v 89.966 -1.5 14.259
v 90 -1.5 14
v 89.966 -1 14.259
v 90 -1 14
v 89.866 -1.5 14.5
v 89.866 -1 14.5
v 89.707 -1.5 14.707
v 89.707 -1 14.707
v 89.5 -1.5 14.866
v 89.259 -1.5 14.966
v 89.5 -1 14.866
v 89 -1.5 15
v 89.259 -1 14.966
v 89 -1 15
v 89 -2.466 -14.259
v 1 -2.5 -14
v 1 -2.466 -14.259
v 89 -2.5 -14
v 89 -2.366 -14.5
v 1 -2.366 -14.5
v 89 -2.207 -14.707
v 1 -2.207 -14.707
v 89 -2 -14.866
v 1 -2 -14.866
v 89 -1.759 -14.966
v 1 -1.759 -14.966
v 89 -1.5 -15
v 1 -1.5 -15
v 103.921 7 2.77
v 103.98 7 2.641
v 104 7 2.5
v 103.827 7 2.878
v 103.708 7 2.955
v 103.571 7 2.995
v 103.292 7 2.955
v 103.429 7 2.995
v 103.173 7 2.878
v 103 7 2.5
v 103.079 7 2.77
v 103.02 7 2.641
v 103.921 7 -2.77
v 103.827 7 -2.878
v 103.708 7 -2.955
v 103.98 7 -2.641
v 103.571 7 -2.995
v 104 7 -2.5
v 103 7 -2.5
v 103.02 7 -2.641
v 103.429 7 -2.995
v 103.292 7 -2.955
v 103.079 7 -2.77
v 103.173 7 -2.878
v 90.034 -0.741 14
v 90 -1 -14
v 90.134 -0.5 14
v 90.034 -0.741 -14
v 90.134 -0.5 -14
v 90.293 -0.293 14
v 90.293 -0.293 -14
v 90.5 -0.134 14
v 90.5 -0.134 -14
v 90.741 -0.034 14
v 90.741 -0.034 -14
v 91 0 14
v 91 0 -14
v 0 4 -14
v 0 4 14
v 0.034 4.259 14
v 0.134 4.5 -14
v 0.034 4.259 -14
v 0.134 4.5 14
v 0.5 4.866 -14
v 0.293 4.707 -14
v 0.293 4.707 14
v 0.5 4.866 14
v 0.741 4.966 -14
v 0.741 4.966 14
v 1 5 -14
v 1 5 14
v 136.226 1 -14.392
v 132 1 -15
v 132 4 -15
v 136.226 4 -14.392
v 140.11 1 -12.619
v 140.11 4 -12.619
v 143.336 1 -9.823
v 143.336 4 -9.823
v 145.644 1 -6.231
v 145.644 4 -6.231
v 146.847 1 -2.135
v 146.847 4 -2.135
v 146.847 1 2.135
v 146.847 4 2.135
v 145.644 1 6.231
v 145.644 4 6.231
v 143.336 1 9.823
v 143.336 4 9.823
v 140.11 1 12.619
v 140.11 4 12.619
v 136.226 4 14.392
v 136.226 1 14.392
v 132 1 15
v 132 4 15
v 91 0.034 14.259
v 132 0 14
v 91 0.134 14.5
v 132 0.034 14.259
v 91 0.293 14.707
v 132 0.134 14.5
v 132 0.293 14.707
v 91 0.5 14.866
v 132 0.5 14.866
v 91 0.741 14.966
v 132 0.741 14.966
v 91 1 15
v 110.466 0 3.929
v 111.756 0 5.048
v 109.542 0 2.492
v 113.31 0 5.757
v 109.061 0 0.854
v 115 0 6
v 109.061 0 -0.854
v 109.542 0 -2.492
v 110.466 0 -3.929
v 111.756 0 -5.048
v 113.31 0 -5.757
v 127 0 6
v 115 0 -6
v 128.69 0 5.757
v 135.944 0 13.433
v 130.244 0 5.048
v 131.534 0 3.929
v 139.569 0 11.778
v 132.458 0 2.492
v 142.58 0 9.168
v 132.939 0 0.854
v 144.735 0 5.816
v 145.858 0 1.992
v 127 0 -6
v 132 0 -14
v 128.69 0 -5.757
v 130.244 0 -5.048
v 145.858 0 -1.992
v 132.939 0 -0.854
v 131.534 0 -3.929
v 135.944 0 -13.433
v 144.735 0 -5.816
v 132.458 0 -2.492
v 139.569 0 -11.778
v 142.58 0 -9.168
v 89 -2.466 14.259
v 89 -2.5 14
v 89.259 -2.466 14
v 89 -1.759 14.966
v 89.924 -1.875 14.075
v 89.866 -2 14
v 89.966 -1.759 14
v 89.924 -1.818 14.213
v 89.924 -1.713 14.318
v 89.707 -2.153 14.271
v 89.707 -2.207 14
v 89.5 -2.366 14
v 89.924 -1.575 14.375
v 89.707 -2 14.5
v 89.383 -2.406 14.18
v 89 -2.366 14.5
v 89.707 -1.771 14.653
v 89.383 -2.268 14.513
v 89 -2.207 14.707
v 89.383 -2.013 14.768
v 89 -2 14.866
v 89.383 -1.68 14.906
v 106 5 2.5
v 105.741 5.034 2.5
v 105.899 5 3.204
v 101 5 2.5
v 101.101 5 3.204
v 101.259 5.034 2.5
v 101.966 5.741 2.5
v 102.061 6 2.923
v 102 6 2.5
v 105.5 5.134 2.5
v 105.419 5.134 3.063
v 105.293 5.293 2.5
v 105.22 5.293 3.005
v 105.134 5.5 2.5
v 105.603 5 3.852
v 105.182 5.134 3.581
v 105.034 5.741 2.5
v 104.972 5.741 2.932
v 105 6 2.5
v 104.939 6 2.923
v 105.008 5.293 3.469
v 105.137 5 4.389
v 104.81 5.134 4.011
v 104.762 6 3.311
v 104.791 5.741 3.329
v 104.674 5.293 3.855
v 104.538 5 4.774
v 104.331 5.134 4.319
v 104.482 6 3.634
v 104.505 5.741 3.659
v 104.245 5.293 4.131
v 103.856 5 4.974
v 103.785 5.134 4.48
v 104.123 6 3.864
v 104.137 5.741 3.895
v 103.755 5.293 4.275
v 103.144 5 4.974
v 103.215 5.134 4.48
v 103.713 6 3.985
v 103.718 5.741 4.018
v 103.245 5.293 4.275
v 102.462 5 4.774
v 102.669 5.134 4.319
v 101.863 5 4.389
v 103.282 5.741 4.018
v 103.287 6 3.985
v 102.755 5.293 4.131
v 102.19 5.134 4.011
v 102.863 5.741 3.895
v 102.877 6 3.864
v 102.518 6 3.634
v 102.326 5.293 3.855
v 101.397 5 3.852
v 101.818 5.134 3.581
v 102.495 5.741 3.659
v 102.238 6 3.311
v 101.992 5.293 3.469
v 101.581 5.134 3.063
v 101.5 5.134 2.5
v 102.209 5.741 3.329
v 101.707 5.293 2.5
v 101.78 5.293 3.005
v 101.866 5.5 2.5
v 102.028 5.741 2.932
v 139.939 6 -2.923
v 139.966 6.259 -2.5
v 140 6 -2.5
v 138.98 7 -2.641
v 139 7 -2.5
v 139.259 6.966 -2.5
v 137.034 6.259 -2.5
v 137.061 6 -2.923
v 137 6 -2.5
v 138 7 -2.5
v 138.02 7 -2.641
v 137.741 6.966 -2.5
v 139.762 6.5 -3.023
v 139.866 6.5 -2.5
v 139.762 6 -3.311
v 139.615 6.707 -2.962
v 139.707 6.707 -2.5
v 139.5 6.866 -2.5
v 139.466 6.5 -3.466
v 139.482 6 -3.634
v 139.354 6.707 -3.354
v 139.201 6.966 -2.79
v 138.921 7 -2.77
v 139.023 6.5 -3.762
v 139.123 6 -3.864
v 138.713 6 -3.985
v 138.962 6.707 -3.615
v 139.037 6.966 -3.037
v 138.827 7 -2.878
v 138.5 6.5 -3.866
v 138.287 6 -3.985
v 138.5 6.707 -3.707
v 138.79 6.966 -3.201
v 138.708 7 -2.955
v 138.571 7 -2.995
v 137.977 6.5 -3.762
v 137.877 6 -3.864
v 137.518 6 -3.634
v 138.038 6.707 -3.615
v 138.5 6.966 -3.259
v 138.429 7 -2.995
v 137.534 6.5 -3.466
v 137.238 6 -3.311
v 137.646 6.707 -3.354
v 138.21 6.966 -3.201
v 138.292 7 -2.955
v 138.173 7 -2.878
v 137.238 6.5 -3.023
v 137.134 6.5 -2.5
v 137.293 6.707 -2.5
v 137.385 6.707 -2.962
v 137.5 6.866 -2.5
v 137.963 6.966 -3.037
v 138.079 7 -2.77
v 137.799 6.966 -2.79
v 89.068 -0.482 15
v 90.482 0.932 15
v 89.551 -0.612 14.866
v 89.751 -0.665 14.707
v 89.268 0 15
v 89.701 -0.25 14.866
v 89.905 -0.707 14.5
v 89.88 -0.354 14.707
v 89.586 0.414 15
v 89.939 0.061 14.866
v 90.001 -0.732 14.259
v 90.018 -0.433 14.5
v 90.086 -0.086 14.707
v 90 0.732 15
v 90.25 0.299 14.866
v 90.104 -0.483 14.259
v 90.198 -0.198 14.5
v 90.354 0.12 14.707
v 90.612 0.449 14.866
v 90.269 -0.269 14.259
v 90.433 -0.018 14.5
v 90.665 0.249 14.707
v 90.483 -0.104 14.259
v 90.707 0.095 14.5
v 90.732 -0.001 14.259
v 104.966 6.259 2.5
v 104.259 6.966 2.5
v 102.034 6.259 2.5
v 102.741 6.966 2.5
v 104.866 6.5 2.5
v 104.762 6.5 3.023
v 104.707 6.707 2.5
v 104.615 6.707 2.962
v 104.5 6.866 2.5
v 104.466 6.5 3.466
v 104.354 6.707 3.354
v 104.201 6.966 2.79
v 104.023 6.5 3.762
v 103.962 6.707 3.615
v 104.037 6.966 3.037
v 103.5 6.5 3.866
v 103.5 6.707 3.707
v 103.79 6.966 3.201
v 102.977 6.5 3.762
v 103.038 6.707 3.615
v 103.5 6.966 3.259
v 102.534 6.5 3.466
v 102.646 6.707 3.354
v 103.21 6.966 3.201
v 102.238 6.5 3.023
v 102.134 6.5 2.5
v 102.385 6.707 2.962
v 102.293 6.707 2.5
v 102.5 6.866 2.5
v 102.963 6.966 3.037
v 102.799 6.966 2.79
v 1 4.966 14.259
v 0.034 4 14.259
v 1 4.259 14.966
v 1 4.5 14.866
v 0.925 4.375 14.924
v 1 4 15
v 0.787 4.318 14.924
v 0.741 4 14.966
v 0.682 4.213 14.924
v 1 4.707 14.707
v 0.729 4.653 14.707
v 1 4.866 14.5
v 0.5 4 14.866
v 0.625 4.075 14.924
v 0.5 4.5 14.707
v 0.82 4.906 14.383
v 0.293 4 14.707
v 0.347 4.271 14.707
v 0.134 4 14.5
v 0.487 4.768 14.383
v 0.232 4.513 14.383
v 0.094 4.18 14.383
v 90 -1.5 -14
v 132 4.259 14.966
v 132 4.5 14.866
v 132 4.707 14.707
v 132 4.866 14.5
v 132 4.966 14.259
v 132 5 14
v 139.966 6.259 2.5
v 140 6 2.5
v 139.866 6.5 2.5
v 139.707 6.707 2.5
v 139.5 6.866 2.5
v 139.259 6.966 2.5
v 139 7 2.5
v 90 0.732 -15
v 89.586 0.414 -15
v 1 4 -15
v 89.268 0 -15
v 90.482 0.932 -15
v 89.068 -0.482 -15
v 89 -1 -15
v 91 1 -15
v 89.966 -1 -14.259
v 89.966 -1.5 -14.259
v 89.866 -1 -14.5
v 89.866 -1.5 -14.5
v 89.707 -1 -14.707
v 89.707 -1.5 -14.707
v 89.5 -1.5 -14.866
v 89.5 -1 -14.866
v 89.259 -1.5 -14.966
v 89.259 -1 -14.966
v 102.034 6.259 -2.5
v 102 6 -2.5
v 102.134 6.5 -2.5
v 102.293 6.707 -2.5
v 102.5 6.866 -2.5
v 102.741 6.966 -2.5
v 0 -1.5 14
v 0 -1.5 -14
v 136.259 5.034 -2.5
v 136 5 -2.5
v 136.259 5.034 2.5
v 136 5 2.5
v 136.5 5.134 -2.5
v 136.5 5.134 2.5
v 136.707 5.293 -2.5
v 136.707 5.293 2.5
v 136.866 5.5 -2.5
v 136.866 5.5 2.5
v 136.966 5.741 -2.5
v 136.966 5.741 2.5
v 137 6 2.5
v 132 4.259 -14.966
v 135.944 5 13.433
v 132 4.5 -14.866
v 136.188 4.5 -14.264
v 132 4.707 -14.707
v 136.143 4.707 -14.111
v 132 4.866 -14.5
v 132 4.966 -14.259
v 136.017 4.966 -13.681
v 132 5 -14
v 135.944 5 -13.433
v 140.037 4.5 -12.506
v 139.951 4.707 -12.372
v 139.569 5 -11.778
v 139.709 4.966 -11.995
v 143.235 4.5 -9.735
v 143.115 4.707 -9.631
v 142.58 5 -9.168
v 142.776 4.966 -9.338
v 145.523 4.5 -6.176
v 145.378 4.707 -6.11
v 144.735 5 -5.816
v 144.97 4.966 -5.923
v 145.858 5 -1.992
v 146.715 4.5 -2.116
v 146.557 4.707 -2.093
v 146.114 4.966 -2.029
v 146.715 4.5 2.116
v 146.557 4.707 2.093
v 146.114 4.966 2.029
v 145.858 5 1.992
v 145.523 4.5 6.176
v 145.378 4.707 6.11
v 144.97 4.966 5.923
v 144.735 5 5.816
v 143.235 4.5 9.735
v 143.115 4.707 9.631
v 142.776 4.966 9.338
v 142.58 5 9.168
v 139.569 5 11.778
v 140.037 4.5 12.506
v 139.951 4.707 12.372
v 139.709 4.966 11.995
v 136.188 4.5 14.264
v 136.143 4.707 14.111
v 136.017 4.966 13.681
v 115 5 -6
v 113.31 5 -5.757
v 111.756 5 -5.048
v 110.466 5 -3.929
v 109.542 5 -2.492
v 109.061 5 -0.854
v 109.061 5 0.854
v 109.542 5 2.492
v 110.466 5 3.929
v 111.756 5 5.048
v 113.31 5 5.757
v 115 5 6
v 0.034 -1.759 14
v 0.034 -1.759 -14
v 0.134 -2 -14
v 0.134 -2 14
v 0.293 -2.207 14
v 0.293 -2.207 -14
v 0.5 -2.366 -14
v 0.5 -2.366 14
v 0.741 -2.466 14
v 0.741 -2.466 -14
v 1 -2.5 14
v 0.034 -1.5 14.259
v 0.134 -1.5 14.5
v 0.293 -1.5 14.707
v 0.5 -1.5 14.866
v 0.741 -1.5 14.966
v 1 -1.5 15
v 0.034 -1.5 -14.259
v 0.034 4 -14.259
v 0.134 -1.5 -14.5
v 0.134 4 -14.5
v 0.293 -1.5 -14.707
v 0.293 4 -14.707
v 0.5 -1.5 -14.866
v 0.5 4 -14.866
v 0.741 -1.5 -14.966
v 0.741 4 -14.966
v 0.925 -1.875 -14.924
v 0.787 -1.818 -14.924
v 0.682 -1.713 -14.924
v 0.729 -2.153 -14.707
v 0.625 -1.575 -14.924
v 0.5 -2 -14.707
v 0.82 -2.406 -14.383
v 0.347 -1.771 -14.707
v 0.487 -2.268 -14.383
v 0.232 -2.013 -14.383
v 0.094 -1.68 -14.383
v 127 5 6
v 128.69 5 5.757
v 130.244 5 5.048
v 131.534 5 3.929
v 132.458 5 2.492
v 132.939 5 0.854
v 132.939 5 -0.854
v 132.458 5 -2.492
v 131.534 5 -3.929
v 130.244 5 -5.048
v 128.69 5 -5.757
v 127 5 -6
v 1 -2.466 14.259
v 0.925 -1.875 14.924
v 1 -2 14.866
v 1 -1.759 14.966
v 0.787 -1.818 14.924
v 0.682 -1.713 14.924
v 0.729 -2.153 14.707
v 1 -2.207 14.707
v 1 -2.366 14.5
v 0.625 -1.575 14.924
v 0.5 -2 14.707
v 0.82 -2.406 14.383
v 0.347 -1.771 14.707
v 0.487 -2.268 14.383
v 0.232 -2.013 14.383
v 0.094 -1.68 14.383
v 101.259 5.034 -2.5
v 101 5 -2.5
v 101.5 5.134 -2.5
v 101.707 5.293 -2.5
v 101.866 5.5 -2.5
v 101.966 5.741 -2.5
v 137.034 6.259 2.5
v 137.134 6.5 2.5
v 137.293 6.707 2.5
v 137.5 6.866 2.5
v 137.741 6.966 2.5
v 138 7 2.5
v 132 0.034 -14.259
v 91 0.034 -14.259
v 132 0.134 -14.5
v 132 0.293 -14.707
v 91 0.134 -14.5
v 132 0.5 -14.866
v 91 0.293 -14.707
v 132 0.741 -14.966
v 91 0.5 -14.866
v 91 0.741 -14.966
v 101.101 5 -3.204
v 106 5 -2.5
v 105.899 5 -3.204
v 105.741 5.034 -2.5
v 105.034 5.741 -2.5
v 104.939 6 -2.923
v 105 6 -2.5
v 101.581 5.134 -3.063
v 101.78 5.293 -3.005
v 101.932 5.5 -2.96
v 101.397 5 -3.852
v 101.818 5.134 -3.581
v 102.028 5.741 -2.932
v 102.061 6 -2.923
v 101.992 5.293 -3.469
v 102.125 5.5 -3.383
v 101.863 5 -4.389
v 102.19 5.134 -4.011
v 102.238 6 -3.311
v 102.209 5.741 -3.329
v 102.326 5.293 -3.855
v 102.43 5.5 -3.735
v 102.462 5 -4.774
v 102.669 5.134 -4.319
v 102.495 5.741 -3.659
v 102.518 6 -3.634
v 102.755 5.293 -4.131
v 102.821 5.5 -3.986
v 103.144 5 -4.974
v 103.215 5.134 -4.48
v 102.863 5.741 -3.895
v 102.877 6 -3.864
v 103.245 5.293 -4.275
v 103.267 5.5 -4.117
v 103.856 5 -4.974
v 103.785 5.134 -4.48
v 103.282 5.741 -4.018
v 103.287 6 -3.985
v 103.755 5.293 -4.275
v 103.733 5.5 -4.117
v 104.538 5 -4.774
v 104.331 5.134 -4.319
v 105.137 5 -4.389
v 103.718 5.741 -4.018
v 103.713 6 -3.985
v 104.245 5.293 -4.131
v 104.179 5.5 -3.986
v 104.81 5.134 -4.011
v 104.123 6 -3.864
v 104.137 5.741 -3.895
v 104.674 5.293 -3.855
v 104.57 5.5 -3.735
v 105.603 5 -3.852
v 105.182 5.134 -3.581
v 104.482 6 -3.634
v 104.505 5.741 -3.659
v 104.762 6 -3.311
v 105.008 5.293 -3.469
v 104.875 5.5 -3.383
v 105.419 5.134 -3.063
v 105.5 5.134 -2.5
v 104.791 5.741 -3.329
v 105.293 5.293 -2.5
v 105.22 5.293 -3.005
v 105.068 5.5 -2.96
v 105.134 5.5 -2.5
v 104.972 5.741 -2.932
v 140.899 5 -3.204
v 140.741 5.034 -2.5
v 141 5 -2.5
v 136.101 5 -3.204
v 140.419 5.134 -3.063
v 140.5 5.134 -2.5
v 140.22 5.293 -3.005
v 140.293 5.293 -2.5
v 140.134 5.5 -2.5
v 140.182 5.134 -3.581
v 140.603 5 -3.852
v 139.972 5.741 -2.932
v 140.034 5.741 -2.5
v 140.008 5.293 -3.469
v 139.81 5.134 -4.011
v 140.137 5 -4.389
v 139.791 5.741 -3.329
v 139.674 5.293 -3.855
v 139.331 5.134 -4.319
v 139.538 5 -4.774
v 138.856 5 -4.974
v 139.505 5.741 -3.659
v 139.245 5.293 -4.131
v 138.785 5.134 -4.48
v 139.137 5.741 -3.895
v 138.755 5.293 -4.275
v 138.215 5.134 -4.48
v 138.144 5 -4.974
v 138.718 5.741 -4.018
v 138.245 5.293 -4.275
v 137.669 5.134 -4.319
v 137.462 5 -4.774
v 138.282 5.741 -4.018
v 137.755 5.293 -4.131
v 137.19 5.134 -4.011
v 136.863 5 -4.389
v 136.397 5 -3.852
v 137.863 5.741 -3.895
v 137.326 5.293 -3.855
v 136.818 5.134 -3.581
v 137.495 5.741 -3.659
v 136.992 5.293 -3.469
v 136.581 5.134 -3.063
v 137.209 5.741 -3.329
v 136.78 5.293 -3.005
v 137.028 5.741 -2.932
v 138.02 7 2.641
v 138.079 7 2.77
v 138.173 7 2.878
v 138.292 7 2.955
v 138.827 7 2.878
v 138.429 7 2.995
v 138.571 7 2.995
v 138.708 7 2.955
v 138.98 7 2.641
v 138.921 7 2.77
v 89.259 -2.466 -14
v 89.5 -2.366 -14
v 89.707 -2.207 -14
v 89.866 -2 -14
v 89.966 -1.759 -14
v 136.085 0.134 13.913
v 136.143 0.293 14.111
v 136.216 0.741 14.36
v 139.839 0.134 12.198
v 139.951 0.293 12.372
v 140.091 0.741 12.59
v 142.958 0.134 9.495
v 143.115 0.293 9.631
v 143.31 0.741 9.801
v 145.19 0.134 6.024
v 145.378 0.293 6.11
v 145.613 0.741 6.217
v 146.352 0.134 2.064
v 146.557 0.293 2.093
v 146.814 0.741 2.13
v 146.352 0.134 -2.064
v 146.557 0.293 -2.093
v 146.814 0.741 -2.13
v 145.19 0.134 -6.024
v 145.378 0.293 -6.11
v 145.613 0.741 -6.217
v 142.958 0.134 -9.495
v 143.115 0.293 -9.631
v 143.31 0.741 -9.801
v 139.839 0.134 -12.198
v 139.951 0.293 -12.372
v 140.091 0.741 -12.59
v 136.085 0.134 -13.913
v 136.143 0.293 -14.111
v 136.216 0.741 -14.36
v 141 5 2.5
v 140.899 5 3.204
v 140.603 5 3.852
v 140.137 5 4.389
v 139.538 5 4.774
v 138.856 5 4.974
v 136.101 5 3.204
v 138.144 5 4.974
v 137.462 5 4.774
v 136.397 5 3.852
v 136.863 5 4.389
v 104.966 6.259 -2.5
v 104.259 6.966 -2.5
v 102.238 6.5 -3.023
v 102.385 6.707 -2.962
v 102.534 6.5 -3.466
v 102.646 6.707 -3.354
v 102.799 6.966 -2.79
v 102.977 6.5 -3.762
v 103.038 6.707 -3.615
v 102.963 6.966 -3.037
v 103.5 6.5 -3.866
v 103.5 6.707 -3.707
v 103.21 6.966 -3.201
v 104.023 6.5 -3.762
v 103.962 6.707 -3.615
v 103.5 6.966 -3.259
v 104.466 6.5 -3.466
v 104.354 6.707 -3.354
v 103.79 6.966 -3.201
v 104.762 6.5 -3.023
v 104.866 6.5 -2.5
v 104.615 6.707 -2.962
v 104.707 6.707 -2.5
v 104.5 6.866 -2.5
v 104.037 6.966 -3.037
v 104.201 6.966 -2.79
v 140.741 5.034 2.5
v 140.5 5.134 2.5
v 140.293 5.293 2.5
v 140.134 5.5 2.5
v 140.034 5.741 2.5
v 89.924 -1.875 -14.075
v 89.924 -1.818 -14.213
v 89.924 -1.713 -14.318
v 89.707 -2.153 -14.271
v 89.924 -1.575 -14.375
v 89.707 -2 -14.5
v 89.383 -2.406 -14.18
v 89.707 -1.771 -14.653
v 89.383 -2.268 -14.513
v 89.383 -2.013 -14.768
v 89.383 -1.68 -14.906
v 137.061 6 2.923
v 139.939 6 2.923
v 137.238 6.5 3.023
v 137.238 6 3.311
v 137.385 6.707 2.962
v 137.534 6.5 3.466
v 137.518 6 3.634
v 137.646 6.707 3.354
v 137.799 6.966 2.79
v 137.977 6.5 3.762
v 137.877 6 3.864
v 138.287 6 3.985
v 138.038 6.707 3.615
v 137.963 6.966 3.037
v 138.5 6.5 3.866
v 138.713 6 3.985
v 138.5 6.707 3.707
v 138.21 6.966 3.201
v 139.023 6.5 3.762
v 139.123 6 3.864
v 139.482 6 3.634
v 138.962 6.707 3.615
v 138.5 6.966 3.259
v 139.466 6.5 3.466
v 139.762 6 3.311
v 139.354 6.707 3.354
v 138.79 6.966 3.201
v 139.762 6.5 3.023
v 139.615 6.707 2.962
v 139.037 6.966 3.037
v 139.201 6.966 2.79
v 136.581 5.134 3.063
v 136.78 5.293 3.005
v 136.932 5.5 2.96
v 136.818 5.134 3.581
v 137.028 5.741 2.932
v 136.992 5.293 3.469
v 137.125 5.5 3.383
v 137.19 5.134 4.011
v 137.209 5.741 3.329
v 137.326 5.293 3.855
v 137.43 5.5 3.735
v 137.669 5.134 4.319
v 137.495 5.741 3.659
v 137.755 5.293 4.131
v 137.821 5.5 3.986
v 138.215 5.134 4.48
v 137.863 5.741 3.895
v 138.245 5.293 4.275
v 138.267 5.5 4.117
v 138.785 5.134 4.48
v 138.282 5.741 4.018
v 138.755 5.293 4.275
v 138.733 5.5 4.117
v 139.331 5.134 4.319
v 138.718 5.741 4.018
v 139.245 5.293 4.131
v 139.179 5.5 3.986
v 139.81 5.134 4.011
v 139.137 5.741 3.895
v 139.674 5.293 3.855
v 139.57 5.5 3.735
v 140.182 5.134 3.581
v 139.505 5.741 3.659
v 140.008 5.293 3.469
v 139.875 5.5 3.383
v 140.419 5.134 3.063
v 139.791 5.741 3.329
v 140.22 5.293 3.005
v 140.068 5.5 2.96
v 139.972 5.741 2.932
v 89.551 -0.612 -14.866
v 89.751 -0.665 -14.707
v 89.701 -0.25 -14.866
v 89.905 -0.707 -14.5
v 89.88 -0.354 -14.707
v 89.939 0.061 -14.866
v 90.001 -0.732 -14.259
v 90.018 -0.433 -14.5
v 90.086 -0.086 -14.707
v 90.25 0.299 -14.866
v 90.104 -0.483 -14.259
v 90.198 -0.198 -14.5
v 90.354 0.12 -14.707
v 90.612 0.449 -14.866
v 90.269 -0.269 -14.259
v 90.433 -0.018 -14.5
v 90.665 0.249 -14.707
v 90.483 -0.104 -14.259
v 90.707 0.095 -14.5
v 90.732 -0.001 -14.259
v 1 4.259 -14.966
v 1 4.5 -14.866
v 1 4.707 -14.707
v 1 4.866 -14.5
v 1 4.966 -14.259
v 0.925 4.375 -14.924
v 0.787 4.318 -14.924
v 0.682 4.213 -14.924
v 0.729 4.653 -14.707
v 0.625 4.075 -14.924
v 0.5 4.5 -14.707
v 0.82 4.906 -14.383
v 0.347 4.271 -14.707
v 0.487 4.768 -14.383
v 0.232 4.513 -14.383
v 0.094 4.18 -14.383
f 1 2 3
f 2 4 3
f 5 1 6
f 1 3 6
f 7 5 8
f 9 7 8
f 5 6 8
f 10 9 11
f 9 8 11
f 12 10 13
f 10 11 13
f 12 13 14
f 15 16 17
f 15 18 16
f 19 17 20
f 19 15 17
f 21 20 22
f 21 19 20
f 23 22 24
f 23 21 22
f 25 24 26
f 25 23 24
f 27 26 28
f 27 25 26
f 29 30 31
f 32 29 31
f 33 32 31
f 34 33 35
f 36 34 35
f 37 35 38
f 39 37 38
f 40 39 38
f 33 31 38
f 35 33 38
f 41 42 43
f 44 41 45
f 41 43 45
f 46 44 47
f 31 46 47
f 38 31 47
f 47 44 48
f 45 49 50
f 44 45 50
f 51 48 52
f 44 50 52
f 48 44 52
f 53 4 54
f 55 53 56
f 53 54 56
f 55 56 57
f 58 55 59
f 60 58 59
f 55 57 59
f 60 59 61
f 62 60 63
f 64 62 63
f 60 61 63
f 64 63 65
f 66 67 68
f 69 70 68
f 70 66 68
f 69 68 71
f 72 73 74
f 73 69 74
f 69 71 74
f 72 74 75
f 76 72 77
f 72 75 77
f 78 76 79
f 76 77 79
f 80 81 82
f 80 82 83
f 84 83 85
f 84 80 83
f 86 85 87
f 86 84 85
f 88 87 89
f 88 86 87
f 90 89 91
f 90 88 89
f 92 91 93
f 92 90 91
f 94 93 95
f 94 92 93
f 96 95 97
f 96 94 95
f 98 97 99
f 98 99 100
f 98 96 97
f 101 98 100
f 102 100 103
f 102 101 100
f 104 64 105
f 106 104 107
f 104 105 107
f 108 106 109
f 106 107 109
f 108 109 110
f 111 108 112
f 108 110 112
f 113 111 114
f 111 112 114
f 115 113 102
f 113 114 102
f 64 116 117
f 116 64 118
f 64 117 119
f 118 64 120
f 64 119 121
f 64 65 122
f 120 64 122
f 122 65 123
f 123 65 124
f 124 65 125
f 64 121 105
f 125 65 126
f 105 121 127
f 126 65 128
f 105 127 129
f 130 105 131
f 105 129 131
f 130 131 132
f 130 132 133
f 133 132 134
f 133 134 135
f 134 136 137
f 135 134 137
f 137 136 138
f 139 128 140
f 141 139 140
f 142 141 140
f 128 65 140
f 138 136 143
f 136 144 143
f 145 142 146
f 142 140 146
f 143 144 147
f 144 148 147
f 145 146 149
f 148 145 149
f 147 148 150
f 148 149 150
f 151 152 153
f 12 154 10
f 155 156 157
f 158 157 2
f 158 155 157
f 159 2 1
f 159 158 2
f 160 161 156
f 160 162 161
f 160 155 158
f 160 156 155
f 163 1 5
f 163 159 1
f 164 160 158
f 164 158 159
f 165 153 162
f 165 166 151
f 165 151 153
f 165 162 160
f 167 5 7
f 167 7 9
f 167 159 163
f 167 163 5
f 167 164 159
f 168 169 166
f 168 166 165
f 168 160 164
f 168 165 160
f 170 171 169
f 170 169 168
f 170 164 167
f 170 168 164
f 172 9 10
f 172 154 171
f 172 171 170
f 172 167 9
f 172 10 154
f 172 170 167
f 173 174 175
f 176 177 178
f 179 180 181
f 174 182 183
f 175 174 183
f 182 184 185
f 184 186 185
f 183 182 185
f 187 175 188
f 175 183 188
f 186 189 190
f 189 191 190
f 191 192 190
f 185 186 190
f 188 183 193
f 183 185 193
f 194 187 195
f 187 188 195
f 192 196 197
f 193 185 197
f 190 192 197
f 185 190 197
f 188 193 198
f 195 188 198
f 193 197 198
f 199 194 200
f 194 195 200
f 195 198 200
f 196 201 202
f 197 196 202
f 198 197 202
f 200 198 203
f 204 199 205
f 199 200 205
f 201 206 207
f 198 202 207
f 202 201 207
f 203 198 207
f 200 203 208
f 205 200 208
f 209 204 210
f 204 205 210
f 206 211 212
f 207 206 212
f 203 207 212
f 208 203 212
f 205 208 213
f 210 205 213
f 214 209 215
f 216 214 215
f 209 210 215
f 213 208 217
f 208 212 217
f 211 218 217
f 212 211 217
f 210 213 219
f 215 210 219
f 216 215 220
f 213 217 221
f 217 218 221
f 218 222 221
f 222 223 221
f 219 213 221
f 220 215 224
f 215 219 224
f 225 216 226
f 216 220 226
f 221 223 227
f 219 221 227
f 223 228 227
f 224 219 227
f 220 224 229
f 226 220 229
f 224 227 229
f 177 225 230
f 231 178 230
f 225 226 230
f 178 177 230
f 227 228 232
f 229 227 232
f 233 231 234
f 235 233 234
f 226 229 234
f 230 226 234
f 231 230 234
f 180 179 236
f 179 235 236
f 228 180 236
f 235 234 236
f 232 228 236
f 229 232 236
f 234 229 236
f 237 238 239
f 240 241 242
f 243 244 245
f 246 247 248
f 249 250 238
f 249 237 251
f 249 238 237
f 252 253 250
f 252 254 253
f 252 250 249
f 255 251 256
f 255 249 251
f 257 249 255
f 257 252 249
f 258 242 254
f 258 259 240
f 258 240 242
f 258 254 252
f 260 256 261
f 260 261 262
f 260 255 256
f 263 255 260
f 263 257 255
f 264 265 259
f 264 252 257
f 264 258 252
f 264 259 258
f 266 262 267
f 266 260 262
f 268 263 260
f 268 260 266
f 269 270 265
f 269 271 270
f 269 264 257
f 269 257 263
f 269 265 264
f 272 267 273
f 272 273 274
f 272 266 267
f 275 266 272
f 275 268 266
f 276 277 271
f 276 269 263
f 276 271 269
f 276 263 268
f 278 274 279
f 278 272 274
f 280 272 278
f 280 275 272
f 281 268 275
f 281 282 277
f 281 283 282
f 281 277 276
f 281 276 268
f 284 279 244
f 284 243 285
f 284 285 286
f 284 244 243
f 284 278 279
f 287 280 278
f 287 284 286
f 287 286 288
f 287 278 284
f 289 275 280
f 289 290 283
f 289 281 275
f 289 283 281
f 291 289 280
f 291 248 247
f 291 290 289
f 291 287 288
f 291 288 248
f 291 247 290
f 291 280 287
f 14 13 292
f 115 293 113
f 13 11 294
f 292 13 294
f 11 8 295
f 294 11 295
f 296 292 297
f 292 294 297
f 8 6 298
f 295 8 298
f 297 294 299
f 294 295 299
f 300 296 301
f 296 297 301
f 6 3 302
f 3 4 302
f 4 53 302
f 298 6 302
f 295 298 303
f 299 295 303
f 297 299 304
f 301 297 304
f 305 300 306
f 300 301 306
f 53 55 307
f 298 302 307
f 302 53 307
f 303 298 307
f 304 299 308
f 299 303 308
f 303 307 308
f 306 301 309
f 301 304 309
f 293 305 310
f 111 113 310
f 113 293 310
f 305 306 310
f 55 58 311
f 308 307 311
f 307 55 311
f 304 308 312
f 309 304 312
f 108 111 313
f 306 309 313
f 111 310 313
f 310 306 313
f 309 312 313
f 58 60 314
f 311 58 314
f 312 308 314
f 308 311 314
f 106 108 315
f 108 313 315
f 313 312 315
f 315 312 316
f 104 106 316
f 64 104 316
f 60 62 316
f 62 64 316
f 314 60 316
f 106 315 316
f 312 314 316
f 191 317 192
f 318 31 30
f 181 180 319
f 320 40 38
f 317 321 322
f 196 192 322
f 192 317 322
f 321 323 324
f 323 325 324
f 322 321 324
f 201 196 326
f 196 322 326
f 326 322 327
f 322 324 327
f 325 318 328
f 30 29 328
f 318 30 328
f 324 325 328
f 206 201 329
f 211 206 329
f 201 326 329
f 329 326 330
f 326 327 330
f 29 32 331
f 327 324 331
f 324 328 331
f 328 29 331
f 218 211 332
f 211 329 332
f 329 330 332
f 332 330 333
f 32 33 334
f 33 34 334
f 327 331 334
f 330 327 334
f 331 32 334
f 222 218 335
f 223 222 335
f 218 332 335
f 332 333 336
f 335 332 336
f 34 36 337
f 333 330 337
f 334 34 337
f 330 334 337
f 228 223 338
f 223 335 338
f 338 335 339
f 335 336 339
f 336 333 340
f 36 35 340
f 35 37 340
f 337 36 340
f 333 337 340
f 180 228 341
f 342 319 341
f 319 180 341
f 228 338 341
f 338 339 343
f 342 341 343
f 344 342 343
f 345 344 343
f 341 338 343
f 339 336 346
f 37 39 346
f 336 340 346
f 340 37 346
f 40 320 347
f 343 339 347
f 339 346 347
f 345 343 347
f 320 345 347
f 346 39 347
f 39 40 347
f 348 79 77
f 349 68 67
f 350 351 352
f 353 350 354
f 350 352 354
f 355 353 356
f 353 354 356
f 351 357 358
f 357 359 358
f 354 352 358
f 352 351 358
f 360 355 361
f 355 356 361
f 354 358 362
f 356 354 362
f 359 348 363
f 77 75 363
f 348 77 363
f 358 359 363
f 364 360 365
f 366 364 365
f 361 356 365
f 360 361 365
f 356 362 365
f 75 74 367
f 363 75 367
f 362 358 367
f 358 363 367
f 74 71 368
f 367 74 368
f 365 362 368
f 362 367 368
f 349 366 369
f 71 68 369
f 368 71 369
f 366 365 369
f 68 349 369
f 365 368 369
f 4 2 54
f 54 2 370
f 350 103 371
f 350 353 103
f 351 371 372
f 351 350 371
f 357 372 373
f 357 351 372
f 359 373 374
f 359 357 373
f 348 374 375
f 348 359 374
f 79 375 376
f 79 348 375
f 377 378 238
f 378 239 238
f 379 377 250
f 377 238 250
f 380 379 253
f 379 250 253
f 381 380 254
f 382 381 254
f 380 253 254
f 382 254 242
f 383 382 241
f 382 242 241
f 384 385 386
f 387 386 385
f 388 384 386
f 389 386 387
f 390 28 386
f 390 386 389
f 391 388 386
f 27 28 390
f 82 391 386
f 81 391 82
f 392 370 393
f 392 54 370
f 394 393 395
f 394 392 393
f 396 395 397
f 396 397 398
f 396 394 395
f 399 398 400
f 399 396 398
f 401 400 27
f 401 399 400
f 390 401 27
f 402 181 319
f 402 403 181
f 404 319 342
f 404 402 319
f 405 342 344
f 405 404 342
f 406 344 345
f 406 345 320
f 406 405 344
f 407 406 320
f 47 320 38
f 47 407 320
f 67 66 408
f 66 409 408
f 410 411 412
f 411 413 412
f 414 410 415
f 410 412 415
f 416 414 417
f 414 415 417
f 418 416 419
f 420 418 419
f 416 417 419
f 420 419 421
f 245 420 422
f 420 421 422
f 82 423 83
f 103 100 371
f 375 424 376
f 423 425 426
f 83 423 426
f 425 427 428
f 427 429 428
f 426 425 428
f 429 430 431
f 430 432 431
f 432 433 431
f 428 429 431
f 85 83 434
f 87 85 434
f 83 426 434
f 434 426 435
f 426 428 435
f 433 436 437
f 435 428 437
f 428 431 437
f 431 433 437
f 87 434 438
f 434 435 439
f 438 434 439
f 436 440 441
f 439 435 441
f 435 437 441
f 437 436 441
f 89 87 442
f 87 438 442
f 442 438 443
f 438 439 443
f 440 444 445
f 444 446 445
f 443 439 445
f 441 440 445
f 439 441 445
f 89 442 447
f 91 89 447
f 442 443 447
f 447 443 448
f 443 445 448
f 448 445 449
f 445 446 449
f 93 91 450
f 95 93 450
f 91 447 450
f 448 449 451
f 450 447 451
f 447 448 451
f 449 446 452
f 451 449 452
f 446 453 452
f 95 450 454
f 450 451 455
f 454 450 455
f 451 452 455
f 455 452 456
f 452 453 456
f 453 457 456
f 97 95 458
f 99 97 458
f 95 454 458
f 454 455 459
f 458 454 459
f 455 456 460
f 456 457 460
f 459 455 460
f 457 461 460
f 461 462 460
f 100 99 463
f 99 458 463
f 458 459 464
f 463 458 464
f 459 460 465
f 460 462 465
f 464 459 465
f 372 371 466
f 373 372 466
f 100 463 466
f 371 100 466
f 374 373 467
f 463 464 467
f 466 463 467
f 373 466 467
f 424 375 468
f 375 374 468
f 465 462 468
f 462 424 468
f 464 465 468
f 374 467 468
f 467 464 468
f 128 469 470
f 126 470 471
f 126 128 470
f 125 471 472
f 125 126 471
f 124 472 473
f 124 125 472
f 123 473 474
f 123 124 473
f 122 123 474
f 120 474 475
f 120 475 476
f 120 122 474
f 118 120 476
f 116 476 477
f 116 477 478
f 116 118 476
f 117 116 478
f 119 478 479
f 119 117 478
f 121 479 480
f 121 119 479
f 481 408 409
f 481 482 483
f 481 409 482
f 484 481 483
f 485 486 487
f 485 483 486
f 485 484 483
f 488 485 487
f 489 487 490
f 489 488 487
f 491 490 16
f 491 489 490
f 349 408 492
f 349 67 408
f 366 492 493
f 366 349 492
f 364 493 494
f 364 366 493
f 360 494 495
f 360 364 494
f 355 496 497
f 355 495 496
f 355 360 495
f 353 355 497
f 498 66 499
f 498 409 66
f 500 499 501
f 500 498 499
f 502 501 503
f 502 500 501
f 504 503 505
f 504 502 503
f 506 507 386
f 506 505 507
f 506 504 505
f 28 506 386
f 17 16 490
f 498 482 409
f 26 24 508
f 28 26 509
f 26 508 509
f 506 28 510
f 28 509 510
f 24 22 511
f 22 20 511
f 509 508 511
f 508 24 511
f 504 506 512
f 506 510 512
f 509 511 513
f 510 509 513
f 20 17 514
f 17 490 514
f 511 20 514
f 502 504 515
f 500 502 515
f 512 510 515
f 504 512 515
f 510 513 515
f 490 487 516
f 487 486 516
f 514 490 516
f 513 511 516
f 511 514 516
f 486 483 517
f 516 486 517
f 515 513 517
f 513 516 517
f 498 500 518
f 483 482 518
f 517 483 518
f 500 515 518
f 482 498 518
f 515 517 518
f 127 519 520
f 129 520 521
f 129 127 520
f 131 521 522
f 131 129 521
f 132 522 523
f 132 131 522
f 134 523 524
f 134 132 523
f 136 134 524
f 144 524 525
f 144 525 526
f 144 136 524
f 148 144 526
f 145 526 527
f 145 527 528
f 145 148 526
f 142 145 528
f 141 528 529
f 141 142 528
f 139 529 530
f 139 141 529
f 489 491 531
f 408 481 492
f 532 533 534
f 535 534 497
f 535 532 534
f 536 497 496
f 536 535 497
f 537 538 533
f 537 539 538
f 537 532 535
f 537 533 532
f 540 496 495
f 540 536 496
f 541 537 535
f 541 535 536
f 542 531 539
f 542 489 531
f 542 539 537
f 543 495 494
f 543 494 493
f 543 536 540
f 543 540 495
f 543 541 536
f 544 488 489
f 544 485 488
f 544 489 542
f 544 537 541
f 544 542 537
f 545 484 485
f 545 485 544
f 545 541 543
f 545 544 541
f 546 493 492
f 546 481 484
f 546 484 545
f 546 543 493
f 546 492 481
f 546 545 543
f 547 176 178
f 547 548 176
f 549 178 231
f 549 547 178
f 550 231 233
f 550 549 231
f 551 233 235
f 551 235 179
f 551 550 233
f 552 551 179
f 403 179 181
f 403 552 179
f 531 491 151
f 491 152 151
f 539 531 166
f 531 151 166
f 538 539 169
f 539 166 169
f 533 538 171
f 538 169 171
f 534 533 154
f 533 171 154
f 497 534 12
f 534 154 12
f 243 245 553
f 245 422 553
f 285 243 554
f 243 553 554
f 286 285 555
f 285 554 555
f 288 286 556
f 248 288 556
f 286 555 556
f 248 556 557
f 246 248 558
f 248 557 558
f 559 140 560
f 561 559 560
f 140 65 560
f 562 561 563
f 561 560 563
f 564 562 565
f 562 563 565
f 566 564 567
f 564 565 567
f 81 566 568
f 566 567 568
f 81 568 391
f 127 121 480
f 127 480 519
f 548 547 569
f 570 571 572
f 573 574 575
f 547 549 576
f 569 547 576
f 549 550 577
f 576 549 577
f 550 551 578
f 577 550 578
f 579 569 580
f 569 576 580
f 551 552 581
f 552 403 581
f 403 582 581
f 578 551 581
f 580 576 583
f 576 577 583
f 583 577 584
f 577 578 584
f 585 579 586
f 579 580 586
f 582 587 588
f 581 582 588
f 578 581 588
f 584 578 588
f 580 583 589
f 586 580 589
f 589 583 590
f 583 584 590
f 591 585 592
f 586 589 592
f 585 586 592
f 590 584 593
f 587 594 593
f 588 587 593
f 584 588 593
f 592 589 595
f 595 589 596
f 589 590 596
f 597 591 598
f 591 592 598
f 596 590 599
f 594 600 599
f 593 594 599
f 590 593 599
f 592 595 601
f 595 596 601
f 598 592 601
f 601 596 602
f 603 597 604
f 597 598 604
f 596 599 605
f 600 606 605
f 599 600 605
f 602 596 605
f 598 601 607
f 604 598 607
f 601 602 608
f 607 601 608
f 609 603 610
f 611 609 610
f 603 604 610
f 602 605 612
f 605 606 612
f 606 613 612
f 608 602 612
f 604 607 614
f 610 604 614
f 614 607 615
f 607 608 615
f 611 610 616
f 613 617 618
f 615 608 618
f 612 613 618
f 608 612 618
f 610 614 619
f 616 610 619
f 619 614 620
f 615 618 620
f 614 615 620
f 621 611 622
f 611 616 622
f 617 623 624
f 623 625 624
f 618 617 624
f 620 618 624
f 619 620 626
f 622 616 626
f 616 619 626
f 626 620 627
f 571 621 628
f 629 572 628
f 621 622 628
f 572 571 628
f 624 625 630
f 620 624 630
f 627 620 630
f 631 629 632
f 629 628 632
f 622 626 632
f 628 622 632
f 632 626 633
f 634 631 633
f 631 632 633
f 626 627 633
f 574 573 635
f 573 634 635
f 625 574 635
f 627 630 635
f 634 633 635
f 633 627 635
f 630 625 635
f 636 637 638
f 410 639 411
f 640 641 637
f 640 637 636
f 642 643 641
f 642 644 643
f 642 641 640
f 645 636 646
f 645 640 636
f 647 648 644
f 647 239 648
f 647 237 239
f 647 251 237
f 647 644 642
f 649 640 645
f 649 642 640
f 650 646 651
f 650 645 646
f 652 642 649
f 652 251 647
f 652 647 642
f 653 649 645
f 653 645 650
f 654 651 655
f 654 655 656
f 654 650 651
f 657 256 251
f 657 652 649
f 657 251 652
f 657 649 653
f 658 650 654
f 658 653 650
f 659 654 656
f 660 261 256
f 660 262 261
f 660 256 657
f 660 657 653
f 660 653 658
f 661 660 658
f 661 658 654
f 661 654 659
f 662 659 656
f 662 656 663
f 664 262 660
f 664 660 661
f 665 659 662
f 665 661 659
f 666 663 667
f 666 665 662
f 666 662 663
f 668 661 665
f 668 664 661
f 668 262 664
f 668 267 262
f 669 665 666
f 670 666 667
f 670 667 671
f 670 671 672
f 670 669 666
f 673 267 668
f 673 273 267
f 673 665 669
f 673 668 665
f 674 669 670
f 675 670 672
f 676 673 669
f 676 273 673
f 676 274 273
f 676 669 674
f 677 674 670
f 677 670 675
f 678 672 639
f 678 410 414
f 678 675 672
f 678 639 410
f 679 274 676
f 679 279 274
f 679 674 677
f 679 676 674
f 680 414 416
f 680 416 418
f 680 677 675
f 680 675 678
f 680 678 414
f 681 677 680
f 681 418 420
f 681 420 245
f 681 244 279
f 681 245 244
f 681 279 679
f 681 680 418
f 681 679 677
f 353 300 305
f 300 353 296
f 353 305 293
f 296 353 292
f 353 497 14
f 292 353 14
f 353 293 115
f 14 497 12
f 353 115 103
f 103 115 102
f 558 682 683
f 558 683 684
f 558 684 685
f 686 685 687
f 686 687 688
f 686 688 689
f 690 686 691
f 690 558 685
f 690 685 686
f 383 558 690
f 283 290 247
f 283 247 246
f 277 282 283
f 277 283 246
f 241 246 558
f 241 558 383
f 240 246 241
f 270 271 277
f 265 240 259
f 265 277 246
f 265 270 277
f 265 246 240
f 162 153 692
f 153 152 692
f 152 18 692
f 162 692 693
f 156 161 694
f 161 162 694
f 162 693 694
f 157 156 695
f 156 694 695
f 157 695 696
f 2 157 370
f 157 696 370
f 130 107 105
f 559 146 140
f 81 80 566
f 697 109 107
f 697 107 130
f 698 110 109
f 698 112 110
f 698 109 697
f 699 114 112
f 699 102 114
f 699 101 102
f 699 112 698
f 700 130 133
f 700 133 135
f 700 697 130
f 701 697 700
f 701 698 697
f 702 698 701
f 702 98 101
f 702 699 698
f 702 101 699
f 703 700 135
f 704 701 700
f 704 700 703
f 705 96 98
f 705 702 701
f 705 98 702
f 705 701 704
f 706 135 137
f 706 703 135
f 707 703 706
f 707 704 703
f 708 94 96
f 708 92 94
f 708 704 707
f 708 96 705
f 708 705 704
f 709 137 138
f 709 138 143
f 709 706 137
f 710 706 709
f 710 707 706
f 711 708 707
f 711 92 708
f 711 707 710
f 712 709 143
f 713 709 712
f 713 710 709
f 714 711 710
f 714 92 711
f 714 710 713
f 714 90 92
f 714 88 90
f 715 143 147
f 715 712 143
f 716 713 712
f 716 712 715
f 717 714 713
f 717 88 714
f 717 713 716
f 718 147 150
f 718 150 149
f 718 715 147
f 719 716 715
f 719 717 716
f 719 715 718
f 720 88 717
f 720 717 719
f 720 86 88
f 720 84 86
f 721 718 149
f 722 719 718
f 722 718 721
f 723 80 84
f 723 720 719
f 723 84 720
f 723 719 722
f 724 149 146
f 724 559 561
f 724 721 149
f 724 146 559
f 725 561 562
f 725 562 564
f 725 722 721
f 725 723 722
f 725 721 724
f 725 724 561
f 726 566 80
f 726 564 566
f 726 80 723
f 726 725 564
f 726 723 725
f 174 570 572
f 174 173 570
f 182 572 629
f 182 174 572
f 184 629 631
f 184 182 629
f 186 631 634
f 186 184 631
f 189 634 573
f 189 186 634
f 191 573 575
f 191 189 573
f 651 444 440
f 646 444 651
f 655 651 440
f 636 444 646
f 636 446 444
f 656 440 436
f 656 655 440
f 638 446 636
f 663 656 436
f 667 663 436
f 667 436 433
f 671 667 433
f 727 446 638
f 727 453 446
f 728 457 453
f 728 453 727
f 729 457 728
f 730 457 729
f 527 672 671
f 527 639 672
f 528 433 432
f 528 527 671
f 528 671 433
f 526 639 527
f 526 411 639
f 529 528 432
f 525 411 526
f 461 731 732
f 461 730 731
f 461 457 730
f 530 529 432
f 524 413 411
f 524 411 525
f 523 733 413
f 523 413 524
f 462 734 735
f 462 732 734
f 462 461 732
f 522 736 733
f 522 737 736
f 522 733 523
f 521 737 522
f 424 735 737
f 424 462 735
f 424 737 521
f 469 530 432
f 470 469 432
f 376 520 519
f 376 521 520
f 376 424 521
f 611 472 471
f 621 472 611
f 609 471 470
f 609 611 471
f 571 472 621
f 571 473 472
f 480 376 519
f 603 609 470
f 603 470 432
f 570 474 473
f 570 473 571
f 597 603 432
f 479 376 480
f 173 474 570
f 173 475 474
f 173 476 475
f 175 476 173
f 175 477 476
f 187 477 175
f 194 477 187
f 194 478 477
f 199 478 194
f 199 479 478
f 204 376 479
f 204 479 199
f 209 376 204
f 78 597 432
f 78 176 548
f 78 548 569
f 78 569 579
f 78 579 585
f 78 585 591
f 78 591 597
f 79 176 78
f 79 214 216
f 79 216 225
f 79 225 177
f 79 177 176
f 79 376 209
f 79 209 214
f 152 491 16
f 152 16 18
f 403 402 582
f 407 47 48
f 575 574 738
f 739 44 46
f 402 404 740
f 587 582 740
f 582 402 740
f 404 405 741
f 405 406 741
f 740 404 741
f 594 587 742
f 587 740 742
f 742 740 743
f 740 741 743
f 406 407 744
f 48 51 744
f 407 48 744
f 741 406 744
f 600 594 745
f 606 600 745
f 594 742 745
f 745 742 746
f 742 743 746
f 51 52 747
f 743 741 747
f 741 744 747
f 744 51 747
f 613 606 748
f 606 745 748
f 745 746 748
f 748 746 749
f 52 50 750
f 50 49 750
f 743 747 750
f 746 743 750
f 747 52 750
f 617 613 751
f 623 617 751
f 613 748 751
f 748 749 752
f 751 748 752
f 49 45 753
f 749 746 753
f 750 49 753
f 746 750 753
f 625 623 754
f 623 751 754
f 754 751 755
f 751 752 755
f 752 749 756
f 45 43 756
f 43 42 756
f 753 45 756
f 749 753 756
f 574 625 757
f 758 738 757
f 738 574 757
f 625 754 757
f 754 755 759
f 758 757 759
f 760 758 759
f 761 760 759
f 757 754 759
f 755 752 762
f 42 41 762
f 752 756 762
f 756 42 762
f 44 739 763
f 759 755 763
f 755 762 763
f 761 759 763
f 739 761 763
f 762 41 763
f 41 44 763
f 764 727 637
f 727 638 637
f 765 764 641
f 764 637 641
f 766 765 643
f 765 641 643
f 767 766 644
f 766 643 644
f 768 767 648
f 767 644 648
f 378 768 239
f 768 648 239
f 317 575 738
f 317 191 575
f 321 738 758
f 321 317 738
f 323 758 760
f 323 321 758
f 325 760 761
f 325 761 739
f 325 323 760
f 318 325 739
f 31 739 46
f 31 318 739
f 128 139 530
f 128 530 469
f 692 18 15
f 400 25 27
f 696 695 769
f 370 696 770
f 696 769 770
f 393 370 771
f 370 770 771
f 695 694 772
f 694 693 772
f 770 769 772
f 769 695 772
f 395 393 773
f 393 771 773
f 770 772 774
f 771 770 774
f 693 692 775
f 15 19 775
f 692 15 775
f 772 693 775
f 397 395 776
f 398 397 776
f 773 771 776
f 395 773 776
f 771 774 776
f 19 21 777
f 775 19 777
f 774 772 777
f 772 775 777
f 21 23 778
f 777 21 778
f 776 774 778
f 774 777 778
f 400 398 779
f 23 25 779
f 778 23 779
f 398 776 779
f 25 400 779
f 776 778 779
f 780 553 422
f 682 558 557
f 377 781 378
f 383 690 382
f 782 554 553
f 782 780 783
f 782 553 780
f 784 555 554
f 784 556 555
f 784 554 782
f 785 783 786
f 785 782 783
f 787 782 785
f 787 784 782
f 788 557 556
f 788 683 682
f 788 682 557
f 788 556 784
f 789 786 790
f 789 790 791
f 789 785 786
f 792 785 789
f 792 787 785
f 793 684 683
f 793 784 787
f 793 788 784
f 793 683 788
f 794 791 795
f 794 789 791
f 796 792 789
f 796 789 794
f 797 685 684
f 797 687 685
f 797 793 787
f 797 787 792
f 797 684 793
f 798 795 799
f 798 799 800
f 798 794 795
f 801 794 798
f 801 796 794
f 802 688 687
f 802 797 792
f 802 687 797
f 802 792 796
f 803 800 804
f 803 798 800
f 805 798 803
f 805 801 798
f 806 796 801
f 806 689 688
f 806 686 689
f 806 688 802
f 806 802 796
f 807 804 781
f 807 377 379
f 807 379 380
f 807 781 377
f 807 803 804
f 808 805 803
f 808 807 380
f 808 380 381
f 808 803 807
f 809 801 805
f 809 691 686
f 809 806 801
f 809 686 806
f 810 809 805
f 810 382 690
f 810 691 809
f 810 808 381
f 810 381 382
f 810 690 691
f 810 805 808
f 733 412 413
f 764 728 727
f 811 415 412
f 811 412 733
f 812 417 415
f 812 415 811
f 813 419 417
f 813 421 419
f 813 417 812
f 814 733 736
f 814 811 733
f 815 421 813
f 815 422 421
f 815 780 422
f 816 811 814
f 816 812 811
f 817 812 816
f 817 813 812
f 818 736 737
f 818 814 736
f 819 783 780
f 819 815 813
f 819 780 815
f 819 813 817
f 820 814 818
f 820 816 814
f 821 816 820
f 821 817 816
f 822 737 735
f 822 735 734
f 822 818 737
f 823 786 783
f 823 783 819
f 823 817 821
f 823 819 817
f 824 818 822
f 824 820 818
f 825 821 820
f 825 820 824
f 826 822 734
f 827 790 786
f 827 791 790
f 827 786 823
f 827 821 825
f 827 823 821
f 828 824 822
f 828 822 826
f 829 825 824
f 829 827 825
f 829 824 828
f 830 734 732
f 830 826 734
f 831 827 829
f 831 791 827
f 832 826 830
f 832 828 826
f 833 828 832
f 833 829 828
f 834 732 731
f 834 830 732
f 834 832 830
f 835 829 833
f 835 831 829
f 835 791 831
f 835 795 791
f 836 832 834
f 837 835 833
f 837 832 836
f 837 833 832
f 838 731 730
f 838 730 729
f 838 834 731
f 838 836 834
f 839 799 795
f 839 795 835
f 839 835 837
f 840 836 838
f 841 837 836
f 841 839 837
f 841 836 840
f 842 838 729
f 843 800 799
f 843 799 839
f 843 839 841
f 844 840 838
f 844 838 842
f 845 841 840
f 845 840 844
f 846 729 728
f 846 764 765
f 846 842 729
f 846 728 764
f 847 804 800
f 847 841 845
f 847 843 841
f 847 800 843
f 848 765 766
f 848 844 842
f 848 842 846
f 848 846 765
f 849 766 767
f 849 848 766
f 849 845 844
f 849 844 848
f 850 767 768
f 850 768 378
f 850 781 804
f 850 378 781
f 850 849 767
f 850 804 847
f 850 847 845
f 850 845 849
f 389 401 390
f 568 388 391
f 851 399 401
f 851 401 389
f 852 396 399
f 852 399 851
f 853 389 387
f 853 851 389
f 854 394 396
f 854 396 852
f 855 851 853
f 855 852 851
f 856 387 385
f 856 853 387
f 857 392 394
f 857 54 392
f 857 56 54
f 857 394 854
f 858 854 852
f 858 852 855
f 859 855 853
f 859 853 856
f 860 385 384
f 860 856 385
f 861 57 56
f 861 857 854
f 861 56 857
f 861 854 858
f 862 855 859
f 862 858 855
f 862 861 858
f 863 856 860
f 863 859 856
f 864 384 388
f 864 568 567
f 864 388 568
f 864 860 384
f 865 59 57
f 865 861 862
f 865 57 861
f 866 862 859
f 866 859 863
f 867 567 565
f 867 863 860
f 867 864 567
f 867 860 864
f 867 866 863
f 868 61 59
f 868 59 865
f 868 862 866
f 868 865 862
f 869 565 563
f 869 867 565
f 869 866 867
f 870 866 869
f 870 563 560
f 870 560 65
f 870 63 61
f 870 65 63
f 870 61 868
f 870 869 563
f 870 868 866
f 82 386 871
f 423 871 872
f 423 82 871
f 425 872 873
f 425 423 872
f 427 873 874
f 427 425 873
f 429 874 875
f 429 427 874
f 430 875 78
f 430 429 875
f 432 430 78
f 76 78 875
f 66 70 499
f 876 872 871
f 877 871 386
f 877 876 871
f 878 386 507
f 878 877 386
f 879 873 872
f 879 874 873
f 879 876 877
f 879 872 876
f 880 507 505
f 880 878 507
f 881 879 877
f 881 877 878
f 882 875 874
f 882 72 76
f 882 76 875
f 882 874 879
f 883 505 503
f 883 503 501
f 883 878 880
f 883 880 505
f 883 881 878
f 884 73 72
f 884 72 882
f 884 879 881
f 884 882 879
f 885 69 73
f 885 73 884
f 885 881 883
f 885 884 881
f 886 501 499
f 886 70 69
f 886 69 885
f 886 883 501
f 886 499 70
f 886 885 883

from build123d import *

# Parameters (mm, degrees)
SZKIC6_W                    = 147
SZKIC6_H                    = 30
DODANIE_WYCI_GNI_CIE2_DEPTH = 5
DODANIE_WYCI_GNI_CIE3_START = 2.5
SZKIC8_W                    = 147
SZKIC8_H                    = 30
DODANIE_WYCI_GNI_CIE3_DEPTH = 2.5
ZAOKR_GLENIE2_RADIUS        = 15
ZAOKR_GLENIE2_LENGTH        = 7.5
SZKIC9_W                    = 57
SZKIC9_H                    = 30
WYTNIJ_WYCI_GNI_CIE1_DEPTH  = 2.5
ZAOKR_GLENIE3_R             = 1
DODANIE_WYCI_GNI_CIE4_DEPTH = 2
ZAOKR_GLENIE4_R             = 1


with BuildPart() as part:
    # Szkic6 → Dodanie-wyciągnięcie2 (new body)
    with BuildSketch(Plane(origin=(0, 0, -30), x_dir=(-1, 0, 0), z_dir=(0, 1, 0))):
        with Locations((-73.5, 30)):
            Rectangle(SZKIC6_W, SZKIC6_H)
        with BuildLine():
            Line((-115, 36), (-127, 36))
            ThreePointArc((-127, 36), (-133, 30), (-127, 24))
            Line((-127, 24), (-115, 24))
            ThreePointArc((-115, 24), (-109, 30), (-115, 36))
        make_face(mode=Mode.SUBTRACT)
    extrude(amount=DODANIE_WYCI_GNI_CIE2_DEPTH)

    # Szkic8 → Dodanie-wyciągnięcie3 (add)
    with BuildSketch(Plane.XZ.offset(DODANIE_WYCI_GNI_CIE3_START)):
        with Locations((73.5, 0)):
            Rectangle(SZKIC8_W, SZKIC8_H)
        with BuildLine():
            Line((127, -6), (115, -6))
            ThreePointArc((115, -6), (109, 0), (115, 6))
            Line((115, 6), (127, 6))
            ThreePointArc((127, 6), (133, 0), (127, -6))
        make_face(mode=Mode.SUBTRACT)
    extrude(amount=-DODANIE_WYCI_GNI_CIE3_DEPTH)

    # Zaokrąglenie2: full round fillet: the end face becomes a half cylinder, R = half its width
    zaokr_glenie2_face = Plane((147, 1.25, 0), x_dir=(0, -1, 0), z_dir=(1, 0, 0))  # on the end face: x along it, z out of the body
    zaokr_glenie2_slab = zaokr_glenie2_face.offset(-ZAOKR_GLENIE2_RADIUS / 2) * Box(ZAOKR_GLENIE2_LENGTH, 2 * ZAOKR_GLENIE2_RADIUS, ZAOKR_GLENIE2_RADIUS, mode=Mode.PRIVATE)  # the body's end, R deep
    zaokr_glenie2_round = Plane((132, 1.25, 0), x_dir=(1, 0, 0), z_dir=(0, -1, 0)) * Cylinder(ZAOKR_GLENIE2_RADIUS, ZAOKR_GLENIE2_LENGTH, mode=Mode.PRIVATE)  # its axis R under the face
    add(zaokr_glenie2_slab - zaokr_glenie2_round, mode=Mode.SUBTRACT)

    # Szkic9 → Wytnij-wyciągnięcie1 (cut)
    with BuildSketch(Plane(origin=(0, -2.5, 0), x_dir=(1, 0, 0), z_dir=(0, 1, 0))):
        with Locations((118.5, 0)):
            Rectangle(SZKIC9_W, SZKIC9_H)
    extrude(amount=WYTNIJ_WYCI_GNI_CIE1_DEPTH, mode=Mode.SUBTRACT)

    # Zaokrąglenie3
    zaokr_glenie3_edges = [part.edges().sort_by_distance(p)[0] for p in [
        (0, 5, 0),
        (66, 5, 15),
        (0, -2.5, 0),
        (45, -2.5, -15),
        (66, 5, -15),
        (147, 5, 0),
        (45, -2.5, 15),
        (90, -2.5, 0),
        (90, -1.25, -15),
        (90, -1.25, 15),
        (111, 0, 15),
        (147, 0, 0),
        (111, 0, -15),
        (90, 0, 0),
        (0, 1.25, 15),
        (0, 1.25, -15),
    ]]
    fillet(zaokr_glenie3_edges, radius=ZAOKR_GLENIE3_R)

    # Szkic10 → Dodanie-wyciągnięcie4 (add)
    with BuildSketch(Plane(origin=(0, 5, 0), x_dir=(1, 0, 0), z_dir=(0, 1, 0))):
        with BuildLine():
            Line((102, -2.5), (102, 2.5))
            ThreePointArc((102, 2.5), (103.5, 4), (105, 2.5))
            Line((105, 2.5), (105, -2.5))
            ThreePointArc((105, -2.5), (103.5, -4), (102, -2.5))
        make_face()
        with BuildLine():
            Line((140, -2.5), (140, 2.5))
            ThreePointArc((140, 2.5), (138.5, 4), (137, 2.5))
            Line((137, 2.5), (137, -2.5))
            ThreePointArc((137, -2.5), (138.5, -4), (140, -2.5))
        make_face()
    extrude(amount=DODANIE_WYCI_GNI_CIE4_DEPTH)

    # Zaokrąglenie4
    zaokr_glenie4_edges = [part.edges().sort_by_distance(p)[0] for p in [
        (137, 7, 0),
        (138.5, 7, -4),
        (140, 7, 0),
        (137, 5, 0),
        (138.5, 5, -4),
        (140, 5, 0),
        (102, 7, 0),
        (103.5, 7, -4),
        (105, 7, 0),
        (102, 5, 0),
        (103.5, 5, -4),
        (105, 5, 0),
        (138.5, 7, 4),
        (138.5, 5, 4),
        (103.5, 7, 4),
        (103.5, 5, 4),
    ]]
    fillet(zaokr_glenie4_edges, radius=ZAOKR_GLENIE4_R - 0.0001)  # a hair under: the kernel refuses the full size


solid = part.part
